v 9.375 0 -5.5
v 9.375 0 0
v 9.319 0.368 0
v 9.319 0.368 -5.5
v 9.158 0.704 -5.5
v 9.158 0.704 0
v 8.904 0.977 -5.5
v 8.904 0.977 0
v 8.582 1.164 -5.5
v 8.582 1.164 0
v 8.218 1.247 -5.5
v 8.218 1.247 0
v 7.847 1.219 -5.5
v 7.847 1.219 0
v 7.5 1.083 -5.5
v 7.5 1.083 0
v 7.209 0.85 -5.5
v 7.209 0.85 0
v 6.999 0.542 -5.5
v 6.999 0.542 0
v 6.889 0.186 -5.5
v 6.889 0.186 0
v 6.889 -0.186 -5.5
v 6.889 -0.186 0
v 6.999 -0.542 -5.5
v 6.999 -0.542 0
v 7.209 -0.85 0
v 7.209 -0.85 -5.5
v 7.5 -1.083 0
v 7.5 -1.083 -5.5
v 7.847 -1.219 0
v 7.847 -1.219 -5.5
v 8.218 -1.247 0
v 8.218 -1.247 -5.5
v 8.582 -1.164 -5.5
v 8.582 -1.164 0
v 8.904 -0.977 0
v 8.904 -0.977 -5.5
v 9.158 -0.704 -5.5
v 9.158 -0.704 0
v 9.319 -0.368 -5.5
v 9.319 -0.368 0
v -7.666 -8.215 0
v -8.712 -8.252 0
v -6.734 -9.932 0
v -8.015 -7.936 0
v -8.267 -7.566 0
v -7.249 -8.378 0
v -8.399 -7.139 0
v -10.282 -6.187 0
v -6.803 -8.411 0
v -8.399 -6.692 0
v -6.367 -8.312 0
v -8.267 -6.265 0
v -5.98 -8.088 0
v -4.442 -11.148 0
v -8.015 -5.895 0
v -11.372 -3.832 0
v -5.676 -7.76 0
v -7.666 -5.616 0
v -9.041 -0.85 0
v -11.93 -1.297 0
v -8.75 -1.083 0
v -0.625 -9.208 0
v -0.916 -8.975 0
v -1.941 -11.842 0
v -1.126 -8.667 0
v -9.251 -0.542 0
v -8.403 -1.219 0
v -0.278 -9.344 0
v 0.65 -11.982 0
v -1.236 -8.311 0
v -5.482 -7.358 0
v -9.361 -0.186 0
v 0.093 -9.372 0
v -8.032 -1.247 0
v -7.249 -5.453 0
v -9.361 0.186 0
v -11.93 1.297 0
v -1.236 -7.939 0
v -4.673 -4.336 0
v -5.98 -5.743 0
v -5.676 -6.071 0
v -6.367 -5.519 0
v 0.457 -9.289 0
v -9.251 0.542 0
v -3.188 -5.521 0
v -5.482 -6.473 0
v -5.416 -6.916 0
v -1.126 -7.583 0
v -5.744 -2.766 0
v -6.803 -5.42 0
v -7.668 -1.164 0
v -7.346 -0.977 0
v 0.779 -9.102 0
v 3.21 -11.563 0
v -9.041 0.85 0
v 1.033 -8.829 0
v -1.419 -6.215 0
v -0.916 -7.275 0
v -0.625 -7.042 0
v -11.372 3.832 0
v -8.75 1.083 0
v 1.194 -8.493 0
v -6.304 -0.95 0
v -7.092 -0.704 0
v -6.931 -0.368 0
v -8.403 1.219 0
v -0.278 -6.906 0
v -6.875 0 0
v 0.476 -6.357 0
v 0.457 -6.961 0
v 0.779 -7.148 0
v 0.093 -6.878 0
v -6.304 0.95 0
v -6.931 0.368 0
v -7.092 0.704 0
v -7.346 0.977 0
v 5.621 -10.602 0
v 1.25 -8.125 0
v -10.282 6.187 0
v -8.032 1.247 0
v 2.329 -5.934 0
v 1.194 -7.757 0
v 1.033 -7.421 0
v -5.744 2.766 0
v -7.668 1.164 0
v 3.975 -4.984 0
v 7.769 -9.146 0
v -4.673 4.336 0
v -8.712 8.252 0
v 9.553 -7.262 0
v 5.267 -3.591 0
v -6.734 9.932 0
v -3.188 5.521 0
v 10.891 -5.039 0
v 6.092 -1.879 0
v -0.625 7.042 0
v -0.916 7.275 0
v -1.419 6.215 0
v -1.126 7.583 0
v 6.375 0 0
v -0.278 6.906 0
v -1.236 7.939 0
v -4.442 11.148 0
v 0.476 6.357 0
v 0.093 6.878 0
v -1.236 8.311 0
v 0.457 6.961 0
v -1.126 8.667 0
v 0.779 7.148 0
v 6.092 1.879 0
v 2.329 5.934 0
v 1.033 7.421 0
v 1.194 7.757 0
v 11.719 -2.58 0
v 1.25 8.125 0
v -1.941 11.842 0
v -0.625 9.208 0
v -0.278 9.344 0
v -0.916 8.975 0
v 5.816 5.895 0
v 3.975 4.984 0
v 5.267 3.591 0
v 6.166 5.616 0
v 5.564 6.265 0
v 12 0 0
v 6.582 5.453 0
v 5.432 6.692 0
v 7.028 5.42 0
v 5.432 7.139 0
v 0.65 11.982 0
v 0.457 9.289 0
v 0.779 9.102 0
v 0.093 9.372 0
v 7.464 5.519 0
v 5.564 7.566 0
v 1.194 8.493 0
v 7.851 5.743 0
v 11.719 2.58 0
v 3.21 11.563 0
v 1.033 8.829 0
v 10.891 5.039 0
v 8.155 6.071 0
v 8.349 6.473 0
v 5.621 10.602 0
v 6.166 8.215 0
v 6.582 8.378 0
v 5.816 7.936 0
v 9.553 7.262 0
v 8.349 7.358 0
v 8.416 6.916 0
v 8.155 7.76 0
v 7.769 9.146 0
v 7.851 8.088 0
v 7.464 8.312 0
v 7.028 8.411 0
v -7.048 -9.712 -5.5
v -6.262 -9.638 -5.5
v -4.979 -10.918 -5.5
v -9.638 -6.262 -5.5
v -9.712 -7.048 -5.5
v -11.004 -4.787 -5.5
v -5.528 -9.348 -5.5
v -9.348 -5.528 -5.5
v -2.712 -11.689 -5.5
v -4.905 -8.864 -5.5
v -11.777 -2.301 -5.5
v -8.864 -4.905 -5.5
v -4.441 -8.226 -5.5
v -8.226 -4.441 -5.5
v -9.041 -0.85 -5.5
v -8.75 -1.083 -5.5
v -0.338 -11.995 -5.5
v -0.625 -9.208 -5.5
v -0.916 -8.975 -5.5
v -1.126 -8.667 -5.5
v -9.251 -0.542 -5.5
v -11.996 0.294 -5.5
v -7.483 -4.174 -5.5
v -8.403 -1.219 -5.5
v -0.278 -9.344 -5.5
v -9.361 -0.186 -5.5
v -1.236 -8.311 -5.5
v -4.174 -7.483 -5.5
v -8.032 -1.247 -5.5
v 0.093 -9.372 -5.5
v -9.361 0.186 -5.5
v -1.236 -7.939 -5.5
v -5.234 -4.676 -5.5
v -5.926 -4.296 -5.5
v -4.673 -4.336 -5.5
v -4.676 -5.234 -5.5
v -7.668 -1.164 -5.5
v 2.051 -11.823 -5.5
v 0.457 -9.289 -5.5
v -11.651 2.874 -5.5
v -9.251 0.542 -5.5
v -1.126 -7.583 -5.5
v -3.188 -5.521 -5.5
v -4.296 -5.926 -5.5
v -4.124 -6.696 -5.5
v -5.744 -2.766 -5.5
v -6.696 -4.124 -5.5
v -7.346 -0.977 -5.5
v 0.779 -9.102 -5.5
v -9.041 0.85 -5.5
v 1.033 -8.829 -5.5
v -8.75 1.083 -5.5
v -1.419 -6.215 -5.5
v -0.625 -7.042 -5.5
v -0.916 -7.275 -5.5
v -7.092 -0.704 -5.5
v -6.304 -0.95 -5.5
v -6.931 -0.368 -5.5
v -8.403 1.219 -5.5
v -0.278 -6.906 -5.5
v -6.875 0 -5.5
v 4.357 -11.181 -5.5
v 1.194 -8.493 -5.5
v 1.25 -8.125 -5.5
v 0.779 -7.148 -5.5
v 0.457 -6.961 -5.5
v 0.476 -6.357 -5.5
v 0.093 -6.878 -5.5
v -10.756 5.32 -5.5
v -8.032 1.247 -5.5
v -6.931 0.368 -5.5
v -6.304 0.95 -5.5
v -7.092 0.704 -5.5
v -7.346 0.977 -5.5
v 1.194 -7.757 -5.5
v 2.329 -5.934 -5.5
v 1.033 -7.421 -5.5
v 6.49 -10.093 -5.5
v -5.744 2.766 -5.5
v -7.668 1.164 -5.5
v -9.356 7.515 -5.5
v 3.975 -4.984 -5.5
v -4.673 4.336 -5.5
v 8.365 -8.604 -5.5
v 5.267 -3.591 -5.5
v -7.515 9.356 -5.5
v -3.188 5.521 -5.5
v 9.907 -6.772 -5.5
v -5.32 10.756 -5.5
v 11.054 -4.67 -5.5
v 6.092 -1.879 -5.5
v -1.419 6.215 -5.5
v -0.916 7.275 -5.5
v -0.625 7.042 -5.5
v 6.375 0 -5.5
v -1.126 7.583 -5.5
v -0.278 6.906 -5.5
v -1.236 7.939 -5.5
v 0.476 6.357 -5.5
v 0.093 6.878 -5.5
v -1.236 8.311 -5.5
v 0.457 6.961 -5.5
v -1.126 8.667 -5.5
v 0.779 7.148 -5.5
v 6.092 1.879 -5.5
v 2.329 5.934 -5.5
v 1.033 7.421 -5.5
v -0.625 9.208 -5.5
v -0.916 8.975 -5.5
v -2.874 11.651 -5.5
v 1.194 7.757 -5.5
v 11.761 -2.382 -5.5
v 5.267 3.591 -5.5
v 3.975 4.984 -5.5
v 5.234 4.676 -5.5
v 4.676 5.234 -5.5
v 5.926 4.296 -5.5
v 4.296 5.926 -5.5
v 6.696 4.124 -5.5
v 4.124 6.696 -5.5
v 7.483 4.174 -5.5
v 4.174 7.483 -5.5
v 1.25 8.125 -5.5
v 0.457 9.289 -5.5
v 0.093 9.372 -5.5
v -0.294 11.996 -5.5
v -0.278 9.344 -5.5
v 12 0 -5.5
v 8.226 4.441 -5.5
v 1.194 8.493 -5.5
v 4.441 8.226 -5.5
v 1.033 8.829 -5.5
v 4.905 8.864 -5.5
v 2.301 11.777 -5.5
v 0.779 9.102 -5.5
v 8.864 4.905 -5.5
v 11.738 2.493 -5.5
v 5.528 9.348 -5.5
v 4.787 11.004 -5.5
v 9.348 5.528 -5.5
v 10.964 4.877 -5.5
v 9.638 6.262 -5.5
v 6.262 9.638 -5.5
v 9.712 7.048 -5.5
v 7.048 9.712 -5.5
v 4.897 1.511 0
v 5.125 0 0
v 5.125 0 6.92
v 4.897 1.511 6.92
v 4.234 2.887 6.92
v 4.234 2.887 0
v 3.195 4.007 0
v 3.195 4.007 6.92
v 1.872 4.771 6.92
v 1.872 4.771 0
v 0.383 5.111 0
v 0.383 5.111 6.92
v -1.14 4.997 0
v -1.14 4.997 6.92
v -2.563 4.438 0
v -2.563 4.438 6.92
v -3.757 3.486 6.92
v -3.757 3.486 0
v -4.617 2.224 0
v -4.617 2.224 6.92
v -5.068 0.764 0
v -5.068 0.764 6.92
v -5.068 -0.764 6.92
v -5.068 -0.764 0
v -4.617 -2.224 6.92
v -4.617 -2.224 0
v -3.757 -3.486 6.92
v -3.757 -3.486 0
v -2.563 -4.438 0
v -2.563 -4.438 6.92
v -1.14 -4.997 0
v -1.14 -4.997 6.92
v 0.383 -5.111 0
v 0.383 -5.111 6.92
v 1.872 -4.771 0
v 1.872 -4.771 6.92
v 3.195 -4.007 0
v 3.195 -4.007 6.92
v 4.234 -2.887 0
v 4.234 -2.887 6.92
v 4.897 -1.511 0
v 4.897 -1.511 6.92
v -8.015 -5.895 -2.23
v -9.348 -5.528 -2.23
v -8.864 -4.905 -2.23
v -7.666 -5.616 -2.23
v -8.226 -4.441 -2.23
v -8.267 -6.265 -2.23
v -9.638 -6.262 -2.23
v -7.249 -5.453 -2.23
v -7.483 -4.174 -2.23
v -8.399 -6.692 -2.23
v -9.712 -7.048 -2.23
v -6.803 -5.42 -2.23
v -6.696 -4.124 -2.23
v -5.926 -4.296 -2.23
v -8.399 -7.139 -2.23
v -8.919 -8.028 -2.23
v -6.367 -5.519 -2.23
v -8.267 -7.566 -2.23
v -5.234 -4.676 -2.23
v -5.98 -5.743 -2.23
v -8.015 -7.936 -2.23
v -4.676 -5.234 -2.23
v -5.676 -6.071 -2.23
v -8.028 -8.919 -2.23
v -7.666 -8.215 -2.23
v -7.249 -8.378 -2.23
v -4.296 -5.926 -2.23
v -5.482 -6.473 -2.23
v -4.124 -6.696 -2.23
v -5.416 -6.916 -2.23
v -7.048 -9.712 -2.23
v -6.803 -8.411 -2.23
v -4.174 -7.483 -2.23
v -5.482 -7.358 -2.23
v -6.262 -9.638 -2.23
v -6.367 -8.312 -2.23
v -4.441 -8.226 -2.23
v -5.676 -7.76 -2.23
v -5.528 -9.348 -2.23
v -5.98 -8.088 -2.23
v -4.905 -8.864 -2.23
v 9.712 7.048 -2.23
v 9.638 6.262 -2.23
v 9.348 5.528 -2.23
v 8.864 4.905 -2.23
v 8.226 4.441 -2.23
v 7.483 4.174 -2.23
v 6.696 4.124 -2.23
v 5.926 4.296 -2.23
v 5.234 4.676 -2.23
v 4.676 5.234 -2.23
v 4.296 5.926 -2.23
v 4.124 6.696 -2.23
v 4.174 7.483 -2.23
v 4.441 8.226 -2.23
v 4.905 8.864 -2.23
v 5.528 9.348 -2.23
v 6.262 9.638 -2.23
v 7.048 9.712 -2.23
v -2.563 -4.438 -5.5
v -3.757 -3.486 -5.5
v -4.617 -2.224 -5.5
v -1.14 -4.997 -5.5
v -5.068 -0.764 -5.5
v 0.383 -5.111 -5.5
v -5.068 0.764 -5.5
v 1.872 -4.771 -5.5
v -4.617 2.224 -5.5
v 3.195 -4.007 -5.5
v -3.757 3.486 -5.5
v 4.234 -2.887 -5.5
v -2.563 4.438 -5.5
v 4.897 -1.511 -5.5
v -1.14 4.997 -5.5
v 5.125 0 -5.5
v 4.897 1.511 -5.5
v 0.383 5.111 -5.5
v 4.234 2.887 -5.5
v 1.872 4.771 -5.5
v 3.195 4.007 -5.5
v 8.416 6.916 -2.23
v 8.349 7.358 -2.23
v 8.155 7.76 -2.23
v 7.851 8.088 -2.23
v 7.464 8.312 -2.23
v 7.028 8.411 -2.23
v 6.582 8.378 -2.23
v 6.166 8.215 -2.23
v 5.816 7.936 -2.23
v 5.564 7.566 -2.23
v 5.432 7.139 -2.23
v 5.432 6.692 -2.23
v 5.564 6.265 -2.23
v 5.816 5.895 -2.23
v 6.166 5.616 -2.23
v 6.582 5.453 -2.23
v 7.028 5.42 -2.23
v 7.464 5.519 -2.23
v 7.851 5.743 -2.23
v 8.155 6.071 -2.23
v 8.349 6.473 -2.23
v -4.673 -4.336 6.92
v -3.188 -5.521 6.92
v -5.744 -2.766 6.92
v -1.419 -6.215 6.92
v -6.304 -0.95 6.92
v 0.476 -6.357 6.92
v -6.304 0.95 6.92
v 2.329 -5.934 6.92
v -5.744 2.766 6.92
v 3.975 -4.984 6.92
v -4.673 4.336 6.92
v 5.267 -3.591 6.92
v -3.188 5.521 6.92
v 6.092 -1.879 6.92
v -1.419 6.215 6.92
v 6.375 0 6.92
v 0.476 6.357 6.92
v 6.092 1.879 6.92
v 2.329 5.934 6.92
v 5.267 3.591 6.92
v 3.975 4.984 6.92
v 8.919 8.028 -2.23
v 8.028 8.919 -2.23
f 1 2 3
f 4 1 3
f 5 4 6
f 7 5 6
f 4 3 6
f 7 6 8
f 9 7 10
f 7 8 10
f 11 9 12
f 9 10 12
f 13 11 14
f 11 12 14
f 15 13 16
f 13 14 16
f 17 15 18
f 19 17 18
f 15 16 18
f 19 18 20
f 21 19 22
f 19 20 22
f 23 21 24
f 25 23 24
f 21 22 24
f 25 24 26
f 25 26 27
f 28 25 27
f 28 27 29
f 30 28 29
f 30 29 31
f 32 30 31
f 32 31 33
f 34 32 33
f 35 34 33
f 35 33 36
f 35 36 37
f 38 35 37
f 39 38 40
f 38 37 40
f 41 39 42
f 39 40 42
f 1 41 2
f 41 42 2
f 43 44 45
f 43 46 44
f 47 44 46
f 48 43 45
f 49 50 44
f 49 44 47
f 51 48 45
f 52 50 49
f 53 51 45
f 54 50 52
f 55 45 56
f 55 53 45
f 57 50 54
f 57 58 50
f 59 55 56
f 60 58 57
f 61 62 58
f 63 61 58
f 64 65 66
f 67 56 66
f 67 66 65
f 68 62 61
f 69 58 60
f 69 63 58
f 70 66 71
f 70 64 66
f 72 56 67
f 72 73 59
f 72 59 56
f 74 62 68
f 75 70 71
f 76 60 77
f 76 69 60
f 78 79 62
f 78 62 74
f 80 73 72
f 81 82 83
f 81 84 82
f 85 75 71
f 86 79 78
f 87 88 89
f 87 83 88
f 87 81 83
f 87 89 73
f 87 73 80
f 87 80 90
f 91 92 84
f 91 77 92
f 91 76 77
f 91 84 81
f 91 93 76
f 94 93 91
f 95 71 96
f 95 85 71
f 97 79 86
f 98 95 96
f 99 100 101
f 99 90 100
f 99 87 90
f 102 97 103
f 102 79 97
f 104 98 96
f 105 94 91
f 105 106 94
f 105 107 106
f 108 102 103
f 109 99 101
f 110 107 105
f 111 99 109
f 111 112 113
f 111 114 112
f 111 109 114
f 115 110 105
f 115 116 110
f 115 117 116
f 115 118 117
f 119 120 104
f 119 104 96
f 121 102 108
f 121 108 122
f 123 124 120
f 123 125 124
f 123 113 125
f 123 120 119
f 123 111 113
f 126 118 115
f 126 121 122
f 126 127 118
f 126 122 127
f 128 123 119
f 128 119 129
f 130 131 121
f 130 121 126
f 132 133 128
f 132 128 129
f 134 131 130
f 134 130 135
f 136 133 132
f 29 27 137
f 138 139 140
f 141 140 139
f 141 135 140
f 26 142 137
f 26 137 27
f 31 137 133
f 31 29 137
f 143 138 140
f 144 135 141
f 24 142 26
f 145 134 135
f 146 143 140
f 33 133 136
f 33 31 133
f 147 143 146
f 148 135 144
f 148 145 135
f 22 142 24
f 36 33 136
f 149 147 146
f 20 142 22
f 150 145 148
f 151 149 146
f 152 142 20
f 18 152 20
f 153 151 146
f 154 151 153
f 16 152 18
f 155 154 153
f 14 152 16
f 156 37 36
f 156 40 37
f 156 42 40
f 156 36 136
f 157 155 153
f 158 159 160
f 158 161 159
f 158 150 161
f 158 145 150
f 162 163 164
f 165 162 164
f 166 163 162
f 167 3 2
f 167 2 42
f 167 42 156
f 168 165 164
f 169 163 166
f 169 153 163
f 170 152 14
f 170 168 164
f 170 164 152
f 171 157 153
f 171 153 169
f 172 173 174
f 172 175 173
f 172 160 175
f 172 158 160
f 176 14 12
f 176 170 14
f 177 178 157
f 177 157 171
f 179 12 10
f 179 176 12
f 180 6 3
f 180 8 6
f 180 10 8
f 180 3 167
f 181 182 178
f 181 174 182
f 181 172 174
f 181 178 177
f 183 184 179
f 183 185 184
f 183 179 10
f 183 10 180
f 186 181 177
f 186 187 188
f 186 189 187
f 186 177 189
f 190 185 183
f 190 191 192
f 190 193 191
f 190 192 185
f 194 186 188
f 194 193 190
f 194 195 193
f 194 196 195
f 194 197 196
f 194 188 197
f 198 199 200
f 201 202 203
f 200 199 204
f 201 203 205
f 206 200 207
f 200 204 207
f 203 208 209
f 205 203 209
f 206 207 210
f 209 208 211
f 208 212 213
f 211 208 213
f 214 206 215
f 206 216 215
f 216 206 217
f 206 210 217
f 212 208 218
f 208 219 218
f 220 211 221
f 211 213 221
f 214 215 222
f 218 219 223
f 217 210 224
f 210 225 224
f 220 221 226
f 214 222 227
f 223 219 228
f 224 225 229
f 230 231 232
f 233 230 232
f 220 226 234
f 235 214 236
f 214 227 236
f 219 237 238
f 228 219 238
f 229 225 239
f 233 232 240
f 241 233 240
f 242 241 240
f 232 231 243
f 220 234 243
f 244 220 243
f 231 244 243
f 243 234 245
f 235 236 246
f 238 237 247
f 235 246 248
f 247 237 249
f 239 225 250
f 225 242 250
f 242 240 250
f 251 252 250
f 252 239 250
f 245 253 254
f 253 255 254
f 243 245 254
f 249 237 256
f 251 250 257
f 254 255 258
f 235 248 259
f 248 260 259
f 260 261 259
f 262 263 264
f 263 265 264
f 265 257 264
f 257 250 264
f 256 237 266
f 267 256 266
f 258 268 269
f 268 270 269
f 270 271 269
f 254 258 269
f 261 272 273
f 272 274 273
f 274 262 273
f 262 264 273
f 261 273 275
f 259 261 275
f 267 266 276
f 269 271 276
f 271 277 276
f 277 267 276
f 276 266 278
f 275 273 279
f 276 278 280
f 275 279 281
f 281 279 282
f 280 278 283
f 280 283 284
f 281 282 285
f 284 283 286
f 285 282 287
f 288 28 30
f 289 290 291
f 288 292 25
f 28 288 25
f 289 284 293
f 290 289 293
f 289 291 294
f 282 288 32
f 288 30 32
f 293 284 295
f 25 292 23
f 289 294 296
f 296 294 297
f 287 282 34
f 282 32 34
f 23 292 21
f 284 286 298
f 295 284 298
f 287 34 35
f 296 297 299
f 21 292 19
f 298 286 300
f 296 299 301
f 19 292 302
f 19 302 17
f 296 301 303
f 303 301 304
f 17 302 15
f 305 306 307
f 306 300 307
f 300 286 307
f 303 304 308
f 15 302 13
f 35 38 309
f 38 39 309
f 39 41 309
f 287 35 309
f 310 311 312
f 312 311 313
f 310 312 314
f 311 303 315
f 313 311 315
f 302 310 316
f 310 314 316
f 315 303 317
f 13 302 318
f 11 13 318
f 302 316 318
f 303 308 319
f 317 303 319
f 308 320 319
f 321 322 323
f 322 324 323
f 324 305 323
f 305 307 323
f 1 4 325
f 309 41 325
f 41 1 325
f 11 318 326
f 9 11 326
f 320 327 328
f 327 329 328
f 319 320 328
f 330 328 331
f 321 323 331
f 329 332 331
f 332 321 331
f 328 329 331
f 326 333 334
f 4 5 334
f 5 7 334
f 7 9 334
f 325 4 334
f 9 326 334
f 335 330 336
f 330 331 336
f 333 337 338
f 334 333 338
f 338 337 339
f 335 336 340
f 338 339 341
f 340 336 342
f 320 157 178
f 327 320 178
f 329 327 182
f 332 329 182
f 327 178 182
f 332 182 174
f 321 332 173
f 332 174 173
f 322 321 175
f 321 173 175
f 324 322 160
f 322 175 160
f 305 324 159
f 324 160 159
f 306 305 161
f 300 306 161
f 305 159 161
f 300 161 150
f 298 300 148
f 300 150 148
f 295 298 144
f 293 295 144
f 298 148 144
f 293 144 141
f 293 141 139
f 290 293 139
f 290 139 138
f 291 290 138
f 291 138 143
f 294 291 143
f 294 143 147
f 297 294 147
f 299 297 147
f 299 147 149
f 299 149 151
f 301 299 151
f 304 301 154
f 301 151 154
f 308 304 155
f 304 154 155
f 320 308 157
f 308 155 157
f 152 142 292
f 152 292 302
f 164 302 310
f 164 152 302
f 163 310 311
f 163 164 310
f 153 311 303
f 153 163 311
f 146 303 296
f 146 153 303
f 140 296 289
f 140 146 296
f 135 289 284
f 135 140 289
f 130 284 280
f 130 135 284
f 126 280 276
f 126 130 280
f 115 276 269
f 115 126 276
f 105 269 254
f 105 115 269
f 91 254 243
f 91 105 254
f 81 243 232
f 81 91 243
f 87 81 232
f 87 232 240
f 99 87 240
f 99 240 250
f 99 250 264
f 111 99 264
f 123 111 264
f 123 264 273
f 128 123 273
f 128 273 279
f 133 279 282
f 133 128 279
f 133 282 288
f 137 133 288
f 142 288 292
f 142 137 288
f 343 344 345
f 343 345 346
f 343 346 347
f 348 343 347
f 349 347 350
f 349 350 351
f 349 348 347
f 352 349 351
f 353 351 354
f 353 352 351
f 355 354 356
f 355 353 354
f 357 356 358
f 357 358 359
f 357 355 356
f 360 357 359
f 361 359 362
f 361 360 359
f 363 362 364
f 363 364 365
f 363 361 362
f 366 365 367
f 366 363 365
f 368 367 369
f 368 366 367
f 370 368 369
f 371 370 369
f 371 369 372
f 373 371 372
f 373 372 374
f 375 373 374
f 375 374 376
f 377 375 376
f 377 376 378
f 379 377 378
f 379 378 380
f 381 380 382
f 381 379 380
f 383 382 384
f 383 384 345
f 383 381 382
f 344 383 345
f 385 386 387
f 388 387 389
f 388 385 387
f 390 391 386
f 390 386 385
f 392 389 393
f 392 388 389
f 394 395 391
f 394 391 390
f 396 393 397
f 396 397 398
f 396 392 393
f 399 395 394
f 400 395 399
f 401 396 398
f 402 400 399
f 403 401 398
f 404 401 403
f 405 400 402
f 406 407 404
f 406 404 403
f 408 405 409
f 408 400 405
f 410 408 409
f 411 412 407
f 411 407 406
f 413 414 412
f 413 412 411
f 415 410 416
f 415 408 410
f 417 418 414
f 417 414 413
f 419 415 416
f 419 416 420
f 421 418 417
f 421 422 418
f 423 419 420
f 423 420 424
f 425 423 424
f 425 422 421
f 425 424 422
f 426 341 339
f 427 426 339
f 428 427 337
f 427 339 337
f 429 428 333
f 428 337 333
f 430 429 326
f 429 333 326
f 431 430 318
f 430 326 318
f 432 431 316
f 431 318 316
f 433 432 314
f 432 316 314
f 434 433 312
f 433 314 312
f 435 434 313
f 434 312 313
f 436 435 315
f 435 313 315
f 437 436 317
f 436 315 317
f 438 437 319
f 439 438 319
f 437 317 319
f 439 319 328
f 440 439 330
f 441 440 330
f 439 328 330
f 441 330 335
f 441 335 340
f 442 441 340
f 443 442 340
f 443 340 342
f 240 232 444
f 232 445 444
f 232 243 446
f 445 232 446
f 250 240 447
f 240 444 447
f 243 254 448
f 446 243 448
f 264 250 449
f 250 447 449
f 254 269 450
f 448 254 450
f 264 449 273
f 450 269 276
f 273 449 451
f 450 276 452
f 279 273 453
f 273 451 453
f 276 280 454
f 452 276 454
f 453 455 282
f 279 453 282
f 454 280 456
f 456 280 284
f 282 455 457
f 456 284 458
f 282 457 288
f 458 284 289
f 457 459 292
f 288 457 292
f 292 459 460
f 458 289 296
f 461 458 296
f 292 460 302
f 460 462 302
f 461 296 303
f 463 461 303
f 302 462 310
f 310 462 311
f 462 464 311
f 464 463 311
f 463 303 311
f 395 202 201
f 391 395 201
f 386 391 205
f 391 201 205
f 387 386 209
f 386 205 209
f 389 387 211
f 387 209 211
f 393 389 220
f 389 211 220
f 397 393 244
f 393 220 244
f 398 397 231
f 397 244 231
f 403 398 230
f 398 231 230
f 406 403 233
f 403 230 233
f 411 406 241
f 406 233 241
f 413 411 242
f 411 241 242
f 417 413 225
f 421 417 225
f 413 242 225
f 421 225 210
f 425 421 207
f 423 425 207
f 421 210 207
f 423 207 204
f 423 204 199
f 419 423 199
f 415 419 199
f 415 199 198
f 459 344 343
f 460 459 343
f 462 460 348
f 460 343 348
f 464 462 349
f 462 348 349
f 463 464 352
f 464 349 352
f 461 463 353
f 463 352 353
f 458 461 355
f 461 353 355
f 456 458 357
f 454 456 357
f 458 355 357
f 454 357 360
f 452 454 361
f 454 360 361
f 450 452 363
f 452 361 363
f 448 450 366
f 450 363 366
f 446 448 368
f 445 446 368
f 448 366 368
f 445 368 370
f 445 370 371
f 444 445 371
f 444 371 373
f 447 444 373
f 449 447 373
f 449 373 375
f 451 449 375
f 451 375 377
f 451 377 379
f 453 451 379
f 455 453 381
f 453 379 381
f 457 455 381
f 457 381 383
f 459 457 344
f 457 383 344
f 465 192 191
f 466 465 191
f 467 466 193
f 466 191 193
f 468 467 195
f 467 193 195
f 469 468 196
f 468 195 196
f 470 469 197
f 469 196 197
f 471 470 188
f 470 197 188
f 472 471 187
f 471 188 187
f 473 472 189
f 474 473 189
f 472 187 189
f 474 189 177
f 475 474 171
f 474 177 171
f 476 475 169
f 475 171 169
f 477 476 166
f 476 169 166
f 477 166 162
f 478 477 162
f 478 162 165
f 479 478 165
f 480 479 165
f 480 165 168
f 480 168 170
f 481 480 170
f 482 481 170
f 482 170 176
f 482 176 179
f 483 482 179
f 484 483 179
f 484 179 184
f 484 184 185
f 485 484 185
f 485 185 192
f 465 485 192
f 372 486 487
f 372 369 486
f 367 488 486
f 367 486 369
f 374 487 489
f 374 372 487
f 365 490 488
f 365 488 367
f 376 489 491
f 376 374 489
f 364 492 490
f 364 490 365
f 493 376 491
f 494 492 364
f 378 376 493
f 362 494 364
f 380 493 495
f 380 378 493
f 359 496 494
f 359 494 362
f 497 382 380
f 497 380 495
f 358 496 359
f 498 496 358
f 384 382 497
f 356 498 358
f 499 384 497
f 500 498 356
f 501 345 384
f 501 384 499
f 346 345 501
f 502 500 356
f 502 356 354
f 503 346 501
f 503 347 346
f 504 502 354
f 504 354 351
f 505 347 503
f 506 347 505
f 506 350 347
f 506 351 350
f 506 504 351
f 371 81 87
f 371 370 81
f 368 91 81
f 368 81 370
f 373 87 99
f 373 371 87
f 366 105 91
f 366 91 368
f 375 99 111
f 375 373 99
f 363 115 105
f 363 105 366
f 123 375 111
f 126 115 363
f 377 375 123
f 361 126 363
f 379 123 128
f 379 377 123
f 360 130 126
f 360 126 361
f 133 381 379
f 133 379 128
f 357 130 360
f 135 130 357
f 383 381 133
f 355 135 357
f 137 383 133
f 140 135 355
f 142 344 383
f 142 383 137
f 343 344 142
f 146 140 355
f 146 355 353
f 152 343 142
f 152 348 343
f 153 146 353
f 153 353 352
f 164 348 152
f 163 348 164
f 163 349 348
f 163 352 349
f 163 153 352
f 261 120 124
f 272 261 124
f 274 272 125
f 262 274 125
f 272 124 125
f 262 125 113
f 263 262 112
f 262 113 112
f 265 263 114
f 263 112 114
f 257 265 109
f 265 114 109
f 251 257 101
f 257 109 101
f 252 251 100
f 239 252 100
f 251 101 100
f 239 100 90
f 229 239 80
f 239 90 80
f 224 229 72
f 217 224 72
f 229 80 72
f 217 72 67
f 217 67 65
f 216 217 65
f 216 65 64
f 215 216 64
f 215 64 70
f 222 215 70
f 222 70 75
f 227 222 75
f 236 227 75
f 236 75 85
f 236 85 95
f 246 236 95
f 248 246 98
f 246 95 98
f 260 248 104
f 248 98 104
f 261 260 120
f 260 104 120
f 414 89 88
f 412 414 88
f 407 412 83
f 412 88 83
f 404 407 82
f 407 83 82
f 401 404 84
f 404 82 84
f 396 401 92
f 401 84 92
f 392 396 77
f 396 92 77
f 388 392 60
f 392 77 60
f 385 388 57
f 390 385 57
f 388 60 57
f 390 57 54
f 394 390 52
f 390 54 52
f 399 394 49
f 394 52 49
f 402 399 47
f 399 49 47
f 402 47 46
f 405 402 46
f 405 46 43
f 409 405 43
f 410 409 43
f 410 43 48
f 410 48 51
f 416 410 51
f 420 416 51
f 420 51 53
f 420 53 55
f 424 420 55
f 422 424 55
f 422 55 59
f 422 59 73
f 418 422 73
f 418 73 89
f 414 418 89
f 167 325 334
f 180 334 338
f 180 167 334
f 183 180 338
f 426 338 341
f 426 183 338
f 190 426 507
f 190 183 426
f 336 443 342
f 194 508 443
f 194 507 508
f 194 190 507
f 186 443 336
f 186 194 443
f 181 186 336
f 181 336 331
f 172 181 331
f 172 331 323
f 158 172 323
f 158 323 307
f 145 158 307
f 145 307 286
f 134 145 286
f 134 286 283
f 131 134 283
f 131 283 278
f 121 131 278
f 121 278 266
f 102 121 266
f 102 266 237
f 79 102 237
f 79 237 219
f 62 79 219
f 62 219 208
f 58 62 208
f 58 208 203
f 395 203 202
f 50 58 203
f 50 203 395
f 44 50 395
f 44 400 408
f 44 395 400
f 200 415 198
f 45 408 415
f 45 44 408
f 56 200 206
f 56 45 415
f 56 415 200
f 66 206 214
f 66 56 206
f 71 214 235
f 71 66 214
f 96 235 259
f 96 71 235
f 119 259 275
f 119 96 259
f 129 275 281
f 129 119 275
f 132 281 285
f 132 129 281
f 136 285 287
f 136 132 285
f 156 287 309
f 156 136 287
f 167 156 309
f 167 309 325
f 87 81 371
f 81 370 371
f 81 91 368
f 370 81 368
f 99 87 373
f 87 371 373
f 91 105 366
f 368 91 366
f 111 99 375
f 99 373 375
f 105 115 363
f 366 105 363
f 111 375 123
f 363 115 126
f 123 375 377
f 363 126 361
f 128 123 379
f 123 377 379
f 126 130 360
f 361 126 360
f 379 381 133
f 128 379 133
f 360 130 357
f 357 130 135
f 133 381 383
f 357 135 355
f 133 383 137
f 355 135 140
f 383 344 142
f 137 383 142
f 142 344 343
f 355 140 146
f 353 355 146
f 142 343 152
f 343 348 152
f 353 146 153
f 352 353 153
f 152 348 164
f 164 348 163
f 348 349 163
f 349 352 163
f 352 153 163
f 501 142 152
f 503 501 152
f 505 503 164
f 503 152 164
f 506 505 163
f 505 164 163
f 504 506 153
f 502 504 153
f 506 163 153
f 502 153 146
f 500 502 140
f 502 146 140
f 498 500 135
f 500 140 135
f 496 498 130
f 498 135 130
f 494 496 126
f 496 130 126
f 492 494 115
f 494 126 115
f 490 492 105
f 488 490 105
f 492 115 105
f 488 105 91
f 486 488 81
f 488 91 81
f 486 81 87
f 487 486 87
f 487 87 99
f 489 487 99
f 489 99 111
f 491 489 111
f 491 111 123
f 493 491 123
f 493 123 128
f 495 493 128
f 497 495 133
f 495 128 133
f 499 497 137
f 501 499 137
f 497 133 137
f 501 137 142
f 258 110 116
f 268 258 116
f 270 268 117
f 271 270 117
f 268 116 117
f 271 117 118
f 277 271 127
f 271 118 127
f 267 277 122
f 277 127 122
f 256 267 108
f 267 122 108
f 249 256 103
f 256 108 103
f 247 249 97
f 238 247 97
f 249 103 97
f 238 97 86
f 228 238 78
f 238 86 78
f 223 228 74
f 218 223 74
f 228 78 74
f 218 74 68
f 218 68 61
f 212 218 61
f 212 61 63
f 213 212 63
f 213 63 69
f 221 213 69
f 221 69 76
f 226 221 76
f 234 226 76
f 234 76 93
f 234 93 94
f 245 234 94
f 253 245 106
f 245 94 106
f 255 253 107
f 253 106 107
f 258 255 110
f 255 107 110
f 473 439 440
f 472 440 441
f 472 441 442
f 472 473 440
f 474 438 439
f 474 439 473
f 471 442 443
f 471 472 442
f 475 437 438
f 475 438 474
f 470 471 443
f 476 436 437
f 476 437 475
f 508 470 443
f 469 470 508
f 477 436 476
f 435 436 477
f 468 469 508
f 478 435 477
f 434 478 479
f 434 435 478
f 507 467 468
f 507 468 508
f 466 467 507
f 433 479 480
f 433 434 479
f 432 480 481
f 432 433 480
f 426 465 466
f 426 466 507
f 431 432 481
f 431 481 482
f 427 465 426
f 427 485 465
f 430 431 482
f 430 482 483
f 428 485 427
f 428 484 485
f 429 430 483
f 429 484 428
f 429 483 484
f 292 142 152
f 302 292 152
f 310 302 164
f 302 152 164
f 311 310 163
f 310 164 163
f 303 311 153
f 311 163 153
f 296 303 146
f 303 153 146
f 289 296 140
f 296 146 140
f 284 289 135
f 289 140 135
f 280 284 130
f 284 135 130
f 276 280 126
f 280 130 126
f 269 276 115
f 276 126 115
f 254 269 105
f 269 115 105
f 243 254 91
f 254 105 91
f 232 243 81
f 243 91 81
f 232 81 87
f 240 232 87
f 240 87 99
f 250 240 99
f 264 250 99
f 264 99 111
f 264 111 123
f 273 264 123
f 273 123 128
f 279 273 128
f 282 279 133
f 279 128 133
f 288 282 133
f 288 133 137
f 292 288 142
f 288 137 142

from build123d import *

# Parameters (mm, degrees)
F0_R     = 6.375
F0_R_2   = 5.125
F1_DEPTH = 6.92
F0_R_3   = 12
F0_R_4   = 1.5
F0_R_5   = 1.25
F2_DEPTH = 5.5
F5_DEPTH = 3.27
F6_DEPTH = 5.5


with BuildPart() as f1:
    # F0 (on Top) → F1 (new body)
    with BuildSketch(Plane.XY):
        Circle(F0_R)
        Circle(F0_R_2, mode=Mode.SUBTRACT)
    extrude(amount=F1_DEPTH)


with BuildPart() as f2:
    # F0 (on Top) → F2 (new body)
    with BuildSketch(Plane.XY):
        Circle(F0_R_3)
        with Locations((-6.91550432, -6.91550432)):
            Circle(F0_R_4, mode=Mode.SUBTRACT)
        with Locations((0, -8.125)):
            Circle(F0_R_5, mode=Mode.SUBTRACT)
        with Locations((-8.125, 0)):
            Circle(F0_R_5, mode=Mode.SUBTRACT)
        Circle(F0_R, mode=Mode.SUBTRACT)
        with Locations((8.125, 0)):
            Circle(F0_R_5, mode=Mode.SUBTRACT)
        with Locations((0, 8.125)):
            Circle(F0_R_5, mode=Mode.SUBTRACT)
        with Locations((6.91550432, 6.91550432)):
            Circle(F0_R_4, mode=Mode.SUBTRACT)
    extrude(amount=-F2_DEPTH)

    # F4 (on offset) → F5 (cut)
    with BuildSketch(Plane(origin=(0, 0, -5.5), x_dir=(1, 0, 0), z_dir=(0, 0, -1))):
        with BuildLine():
            ThreePointArc((-9.7123834889, 7.0476667745), (-4.9356053327, 4.9356053327), (-7.0476667745, 9.7123834889))
            ThreePointArc((-7.0476667745, 9.7123834889), (-8.4852813742, 8.4852813742), (-9.7123834889, 7.0476667745))
        make_face()
        with BuildLine():
            ThreePointArc((7.0476667745, -9.7123834889), (8.4852813742, -8.4852813742), (9.7123834889, -7.0476667745))
            ThreePointArc((9.7123834889, -7.0476667745), (4.9356053327, -4.9356053327), (7.0476667745, -9.7123834889))
        make_face()
    extrude(amount=-F5_DEPTH, mode=Mode.SUBTRACT)


with BuildPart() as f6:
    # F0 (on Top) → F6 (new body)
    with BuildSketch(Plane.XY):
        Circle(F0_R)
        Circle(F0_R_2, mode=Mode.SUBTRACT)
    extrude(amount=-F6_DEPTH)


solid = Compound([f1.part, f2.part, f6.part])
